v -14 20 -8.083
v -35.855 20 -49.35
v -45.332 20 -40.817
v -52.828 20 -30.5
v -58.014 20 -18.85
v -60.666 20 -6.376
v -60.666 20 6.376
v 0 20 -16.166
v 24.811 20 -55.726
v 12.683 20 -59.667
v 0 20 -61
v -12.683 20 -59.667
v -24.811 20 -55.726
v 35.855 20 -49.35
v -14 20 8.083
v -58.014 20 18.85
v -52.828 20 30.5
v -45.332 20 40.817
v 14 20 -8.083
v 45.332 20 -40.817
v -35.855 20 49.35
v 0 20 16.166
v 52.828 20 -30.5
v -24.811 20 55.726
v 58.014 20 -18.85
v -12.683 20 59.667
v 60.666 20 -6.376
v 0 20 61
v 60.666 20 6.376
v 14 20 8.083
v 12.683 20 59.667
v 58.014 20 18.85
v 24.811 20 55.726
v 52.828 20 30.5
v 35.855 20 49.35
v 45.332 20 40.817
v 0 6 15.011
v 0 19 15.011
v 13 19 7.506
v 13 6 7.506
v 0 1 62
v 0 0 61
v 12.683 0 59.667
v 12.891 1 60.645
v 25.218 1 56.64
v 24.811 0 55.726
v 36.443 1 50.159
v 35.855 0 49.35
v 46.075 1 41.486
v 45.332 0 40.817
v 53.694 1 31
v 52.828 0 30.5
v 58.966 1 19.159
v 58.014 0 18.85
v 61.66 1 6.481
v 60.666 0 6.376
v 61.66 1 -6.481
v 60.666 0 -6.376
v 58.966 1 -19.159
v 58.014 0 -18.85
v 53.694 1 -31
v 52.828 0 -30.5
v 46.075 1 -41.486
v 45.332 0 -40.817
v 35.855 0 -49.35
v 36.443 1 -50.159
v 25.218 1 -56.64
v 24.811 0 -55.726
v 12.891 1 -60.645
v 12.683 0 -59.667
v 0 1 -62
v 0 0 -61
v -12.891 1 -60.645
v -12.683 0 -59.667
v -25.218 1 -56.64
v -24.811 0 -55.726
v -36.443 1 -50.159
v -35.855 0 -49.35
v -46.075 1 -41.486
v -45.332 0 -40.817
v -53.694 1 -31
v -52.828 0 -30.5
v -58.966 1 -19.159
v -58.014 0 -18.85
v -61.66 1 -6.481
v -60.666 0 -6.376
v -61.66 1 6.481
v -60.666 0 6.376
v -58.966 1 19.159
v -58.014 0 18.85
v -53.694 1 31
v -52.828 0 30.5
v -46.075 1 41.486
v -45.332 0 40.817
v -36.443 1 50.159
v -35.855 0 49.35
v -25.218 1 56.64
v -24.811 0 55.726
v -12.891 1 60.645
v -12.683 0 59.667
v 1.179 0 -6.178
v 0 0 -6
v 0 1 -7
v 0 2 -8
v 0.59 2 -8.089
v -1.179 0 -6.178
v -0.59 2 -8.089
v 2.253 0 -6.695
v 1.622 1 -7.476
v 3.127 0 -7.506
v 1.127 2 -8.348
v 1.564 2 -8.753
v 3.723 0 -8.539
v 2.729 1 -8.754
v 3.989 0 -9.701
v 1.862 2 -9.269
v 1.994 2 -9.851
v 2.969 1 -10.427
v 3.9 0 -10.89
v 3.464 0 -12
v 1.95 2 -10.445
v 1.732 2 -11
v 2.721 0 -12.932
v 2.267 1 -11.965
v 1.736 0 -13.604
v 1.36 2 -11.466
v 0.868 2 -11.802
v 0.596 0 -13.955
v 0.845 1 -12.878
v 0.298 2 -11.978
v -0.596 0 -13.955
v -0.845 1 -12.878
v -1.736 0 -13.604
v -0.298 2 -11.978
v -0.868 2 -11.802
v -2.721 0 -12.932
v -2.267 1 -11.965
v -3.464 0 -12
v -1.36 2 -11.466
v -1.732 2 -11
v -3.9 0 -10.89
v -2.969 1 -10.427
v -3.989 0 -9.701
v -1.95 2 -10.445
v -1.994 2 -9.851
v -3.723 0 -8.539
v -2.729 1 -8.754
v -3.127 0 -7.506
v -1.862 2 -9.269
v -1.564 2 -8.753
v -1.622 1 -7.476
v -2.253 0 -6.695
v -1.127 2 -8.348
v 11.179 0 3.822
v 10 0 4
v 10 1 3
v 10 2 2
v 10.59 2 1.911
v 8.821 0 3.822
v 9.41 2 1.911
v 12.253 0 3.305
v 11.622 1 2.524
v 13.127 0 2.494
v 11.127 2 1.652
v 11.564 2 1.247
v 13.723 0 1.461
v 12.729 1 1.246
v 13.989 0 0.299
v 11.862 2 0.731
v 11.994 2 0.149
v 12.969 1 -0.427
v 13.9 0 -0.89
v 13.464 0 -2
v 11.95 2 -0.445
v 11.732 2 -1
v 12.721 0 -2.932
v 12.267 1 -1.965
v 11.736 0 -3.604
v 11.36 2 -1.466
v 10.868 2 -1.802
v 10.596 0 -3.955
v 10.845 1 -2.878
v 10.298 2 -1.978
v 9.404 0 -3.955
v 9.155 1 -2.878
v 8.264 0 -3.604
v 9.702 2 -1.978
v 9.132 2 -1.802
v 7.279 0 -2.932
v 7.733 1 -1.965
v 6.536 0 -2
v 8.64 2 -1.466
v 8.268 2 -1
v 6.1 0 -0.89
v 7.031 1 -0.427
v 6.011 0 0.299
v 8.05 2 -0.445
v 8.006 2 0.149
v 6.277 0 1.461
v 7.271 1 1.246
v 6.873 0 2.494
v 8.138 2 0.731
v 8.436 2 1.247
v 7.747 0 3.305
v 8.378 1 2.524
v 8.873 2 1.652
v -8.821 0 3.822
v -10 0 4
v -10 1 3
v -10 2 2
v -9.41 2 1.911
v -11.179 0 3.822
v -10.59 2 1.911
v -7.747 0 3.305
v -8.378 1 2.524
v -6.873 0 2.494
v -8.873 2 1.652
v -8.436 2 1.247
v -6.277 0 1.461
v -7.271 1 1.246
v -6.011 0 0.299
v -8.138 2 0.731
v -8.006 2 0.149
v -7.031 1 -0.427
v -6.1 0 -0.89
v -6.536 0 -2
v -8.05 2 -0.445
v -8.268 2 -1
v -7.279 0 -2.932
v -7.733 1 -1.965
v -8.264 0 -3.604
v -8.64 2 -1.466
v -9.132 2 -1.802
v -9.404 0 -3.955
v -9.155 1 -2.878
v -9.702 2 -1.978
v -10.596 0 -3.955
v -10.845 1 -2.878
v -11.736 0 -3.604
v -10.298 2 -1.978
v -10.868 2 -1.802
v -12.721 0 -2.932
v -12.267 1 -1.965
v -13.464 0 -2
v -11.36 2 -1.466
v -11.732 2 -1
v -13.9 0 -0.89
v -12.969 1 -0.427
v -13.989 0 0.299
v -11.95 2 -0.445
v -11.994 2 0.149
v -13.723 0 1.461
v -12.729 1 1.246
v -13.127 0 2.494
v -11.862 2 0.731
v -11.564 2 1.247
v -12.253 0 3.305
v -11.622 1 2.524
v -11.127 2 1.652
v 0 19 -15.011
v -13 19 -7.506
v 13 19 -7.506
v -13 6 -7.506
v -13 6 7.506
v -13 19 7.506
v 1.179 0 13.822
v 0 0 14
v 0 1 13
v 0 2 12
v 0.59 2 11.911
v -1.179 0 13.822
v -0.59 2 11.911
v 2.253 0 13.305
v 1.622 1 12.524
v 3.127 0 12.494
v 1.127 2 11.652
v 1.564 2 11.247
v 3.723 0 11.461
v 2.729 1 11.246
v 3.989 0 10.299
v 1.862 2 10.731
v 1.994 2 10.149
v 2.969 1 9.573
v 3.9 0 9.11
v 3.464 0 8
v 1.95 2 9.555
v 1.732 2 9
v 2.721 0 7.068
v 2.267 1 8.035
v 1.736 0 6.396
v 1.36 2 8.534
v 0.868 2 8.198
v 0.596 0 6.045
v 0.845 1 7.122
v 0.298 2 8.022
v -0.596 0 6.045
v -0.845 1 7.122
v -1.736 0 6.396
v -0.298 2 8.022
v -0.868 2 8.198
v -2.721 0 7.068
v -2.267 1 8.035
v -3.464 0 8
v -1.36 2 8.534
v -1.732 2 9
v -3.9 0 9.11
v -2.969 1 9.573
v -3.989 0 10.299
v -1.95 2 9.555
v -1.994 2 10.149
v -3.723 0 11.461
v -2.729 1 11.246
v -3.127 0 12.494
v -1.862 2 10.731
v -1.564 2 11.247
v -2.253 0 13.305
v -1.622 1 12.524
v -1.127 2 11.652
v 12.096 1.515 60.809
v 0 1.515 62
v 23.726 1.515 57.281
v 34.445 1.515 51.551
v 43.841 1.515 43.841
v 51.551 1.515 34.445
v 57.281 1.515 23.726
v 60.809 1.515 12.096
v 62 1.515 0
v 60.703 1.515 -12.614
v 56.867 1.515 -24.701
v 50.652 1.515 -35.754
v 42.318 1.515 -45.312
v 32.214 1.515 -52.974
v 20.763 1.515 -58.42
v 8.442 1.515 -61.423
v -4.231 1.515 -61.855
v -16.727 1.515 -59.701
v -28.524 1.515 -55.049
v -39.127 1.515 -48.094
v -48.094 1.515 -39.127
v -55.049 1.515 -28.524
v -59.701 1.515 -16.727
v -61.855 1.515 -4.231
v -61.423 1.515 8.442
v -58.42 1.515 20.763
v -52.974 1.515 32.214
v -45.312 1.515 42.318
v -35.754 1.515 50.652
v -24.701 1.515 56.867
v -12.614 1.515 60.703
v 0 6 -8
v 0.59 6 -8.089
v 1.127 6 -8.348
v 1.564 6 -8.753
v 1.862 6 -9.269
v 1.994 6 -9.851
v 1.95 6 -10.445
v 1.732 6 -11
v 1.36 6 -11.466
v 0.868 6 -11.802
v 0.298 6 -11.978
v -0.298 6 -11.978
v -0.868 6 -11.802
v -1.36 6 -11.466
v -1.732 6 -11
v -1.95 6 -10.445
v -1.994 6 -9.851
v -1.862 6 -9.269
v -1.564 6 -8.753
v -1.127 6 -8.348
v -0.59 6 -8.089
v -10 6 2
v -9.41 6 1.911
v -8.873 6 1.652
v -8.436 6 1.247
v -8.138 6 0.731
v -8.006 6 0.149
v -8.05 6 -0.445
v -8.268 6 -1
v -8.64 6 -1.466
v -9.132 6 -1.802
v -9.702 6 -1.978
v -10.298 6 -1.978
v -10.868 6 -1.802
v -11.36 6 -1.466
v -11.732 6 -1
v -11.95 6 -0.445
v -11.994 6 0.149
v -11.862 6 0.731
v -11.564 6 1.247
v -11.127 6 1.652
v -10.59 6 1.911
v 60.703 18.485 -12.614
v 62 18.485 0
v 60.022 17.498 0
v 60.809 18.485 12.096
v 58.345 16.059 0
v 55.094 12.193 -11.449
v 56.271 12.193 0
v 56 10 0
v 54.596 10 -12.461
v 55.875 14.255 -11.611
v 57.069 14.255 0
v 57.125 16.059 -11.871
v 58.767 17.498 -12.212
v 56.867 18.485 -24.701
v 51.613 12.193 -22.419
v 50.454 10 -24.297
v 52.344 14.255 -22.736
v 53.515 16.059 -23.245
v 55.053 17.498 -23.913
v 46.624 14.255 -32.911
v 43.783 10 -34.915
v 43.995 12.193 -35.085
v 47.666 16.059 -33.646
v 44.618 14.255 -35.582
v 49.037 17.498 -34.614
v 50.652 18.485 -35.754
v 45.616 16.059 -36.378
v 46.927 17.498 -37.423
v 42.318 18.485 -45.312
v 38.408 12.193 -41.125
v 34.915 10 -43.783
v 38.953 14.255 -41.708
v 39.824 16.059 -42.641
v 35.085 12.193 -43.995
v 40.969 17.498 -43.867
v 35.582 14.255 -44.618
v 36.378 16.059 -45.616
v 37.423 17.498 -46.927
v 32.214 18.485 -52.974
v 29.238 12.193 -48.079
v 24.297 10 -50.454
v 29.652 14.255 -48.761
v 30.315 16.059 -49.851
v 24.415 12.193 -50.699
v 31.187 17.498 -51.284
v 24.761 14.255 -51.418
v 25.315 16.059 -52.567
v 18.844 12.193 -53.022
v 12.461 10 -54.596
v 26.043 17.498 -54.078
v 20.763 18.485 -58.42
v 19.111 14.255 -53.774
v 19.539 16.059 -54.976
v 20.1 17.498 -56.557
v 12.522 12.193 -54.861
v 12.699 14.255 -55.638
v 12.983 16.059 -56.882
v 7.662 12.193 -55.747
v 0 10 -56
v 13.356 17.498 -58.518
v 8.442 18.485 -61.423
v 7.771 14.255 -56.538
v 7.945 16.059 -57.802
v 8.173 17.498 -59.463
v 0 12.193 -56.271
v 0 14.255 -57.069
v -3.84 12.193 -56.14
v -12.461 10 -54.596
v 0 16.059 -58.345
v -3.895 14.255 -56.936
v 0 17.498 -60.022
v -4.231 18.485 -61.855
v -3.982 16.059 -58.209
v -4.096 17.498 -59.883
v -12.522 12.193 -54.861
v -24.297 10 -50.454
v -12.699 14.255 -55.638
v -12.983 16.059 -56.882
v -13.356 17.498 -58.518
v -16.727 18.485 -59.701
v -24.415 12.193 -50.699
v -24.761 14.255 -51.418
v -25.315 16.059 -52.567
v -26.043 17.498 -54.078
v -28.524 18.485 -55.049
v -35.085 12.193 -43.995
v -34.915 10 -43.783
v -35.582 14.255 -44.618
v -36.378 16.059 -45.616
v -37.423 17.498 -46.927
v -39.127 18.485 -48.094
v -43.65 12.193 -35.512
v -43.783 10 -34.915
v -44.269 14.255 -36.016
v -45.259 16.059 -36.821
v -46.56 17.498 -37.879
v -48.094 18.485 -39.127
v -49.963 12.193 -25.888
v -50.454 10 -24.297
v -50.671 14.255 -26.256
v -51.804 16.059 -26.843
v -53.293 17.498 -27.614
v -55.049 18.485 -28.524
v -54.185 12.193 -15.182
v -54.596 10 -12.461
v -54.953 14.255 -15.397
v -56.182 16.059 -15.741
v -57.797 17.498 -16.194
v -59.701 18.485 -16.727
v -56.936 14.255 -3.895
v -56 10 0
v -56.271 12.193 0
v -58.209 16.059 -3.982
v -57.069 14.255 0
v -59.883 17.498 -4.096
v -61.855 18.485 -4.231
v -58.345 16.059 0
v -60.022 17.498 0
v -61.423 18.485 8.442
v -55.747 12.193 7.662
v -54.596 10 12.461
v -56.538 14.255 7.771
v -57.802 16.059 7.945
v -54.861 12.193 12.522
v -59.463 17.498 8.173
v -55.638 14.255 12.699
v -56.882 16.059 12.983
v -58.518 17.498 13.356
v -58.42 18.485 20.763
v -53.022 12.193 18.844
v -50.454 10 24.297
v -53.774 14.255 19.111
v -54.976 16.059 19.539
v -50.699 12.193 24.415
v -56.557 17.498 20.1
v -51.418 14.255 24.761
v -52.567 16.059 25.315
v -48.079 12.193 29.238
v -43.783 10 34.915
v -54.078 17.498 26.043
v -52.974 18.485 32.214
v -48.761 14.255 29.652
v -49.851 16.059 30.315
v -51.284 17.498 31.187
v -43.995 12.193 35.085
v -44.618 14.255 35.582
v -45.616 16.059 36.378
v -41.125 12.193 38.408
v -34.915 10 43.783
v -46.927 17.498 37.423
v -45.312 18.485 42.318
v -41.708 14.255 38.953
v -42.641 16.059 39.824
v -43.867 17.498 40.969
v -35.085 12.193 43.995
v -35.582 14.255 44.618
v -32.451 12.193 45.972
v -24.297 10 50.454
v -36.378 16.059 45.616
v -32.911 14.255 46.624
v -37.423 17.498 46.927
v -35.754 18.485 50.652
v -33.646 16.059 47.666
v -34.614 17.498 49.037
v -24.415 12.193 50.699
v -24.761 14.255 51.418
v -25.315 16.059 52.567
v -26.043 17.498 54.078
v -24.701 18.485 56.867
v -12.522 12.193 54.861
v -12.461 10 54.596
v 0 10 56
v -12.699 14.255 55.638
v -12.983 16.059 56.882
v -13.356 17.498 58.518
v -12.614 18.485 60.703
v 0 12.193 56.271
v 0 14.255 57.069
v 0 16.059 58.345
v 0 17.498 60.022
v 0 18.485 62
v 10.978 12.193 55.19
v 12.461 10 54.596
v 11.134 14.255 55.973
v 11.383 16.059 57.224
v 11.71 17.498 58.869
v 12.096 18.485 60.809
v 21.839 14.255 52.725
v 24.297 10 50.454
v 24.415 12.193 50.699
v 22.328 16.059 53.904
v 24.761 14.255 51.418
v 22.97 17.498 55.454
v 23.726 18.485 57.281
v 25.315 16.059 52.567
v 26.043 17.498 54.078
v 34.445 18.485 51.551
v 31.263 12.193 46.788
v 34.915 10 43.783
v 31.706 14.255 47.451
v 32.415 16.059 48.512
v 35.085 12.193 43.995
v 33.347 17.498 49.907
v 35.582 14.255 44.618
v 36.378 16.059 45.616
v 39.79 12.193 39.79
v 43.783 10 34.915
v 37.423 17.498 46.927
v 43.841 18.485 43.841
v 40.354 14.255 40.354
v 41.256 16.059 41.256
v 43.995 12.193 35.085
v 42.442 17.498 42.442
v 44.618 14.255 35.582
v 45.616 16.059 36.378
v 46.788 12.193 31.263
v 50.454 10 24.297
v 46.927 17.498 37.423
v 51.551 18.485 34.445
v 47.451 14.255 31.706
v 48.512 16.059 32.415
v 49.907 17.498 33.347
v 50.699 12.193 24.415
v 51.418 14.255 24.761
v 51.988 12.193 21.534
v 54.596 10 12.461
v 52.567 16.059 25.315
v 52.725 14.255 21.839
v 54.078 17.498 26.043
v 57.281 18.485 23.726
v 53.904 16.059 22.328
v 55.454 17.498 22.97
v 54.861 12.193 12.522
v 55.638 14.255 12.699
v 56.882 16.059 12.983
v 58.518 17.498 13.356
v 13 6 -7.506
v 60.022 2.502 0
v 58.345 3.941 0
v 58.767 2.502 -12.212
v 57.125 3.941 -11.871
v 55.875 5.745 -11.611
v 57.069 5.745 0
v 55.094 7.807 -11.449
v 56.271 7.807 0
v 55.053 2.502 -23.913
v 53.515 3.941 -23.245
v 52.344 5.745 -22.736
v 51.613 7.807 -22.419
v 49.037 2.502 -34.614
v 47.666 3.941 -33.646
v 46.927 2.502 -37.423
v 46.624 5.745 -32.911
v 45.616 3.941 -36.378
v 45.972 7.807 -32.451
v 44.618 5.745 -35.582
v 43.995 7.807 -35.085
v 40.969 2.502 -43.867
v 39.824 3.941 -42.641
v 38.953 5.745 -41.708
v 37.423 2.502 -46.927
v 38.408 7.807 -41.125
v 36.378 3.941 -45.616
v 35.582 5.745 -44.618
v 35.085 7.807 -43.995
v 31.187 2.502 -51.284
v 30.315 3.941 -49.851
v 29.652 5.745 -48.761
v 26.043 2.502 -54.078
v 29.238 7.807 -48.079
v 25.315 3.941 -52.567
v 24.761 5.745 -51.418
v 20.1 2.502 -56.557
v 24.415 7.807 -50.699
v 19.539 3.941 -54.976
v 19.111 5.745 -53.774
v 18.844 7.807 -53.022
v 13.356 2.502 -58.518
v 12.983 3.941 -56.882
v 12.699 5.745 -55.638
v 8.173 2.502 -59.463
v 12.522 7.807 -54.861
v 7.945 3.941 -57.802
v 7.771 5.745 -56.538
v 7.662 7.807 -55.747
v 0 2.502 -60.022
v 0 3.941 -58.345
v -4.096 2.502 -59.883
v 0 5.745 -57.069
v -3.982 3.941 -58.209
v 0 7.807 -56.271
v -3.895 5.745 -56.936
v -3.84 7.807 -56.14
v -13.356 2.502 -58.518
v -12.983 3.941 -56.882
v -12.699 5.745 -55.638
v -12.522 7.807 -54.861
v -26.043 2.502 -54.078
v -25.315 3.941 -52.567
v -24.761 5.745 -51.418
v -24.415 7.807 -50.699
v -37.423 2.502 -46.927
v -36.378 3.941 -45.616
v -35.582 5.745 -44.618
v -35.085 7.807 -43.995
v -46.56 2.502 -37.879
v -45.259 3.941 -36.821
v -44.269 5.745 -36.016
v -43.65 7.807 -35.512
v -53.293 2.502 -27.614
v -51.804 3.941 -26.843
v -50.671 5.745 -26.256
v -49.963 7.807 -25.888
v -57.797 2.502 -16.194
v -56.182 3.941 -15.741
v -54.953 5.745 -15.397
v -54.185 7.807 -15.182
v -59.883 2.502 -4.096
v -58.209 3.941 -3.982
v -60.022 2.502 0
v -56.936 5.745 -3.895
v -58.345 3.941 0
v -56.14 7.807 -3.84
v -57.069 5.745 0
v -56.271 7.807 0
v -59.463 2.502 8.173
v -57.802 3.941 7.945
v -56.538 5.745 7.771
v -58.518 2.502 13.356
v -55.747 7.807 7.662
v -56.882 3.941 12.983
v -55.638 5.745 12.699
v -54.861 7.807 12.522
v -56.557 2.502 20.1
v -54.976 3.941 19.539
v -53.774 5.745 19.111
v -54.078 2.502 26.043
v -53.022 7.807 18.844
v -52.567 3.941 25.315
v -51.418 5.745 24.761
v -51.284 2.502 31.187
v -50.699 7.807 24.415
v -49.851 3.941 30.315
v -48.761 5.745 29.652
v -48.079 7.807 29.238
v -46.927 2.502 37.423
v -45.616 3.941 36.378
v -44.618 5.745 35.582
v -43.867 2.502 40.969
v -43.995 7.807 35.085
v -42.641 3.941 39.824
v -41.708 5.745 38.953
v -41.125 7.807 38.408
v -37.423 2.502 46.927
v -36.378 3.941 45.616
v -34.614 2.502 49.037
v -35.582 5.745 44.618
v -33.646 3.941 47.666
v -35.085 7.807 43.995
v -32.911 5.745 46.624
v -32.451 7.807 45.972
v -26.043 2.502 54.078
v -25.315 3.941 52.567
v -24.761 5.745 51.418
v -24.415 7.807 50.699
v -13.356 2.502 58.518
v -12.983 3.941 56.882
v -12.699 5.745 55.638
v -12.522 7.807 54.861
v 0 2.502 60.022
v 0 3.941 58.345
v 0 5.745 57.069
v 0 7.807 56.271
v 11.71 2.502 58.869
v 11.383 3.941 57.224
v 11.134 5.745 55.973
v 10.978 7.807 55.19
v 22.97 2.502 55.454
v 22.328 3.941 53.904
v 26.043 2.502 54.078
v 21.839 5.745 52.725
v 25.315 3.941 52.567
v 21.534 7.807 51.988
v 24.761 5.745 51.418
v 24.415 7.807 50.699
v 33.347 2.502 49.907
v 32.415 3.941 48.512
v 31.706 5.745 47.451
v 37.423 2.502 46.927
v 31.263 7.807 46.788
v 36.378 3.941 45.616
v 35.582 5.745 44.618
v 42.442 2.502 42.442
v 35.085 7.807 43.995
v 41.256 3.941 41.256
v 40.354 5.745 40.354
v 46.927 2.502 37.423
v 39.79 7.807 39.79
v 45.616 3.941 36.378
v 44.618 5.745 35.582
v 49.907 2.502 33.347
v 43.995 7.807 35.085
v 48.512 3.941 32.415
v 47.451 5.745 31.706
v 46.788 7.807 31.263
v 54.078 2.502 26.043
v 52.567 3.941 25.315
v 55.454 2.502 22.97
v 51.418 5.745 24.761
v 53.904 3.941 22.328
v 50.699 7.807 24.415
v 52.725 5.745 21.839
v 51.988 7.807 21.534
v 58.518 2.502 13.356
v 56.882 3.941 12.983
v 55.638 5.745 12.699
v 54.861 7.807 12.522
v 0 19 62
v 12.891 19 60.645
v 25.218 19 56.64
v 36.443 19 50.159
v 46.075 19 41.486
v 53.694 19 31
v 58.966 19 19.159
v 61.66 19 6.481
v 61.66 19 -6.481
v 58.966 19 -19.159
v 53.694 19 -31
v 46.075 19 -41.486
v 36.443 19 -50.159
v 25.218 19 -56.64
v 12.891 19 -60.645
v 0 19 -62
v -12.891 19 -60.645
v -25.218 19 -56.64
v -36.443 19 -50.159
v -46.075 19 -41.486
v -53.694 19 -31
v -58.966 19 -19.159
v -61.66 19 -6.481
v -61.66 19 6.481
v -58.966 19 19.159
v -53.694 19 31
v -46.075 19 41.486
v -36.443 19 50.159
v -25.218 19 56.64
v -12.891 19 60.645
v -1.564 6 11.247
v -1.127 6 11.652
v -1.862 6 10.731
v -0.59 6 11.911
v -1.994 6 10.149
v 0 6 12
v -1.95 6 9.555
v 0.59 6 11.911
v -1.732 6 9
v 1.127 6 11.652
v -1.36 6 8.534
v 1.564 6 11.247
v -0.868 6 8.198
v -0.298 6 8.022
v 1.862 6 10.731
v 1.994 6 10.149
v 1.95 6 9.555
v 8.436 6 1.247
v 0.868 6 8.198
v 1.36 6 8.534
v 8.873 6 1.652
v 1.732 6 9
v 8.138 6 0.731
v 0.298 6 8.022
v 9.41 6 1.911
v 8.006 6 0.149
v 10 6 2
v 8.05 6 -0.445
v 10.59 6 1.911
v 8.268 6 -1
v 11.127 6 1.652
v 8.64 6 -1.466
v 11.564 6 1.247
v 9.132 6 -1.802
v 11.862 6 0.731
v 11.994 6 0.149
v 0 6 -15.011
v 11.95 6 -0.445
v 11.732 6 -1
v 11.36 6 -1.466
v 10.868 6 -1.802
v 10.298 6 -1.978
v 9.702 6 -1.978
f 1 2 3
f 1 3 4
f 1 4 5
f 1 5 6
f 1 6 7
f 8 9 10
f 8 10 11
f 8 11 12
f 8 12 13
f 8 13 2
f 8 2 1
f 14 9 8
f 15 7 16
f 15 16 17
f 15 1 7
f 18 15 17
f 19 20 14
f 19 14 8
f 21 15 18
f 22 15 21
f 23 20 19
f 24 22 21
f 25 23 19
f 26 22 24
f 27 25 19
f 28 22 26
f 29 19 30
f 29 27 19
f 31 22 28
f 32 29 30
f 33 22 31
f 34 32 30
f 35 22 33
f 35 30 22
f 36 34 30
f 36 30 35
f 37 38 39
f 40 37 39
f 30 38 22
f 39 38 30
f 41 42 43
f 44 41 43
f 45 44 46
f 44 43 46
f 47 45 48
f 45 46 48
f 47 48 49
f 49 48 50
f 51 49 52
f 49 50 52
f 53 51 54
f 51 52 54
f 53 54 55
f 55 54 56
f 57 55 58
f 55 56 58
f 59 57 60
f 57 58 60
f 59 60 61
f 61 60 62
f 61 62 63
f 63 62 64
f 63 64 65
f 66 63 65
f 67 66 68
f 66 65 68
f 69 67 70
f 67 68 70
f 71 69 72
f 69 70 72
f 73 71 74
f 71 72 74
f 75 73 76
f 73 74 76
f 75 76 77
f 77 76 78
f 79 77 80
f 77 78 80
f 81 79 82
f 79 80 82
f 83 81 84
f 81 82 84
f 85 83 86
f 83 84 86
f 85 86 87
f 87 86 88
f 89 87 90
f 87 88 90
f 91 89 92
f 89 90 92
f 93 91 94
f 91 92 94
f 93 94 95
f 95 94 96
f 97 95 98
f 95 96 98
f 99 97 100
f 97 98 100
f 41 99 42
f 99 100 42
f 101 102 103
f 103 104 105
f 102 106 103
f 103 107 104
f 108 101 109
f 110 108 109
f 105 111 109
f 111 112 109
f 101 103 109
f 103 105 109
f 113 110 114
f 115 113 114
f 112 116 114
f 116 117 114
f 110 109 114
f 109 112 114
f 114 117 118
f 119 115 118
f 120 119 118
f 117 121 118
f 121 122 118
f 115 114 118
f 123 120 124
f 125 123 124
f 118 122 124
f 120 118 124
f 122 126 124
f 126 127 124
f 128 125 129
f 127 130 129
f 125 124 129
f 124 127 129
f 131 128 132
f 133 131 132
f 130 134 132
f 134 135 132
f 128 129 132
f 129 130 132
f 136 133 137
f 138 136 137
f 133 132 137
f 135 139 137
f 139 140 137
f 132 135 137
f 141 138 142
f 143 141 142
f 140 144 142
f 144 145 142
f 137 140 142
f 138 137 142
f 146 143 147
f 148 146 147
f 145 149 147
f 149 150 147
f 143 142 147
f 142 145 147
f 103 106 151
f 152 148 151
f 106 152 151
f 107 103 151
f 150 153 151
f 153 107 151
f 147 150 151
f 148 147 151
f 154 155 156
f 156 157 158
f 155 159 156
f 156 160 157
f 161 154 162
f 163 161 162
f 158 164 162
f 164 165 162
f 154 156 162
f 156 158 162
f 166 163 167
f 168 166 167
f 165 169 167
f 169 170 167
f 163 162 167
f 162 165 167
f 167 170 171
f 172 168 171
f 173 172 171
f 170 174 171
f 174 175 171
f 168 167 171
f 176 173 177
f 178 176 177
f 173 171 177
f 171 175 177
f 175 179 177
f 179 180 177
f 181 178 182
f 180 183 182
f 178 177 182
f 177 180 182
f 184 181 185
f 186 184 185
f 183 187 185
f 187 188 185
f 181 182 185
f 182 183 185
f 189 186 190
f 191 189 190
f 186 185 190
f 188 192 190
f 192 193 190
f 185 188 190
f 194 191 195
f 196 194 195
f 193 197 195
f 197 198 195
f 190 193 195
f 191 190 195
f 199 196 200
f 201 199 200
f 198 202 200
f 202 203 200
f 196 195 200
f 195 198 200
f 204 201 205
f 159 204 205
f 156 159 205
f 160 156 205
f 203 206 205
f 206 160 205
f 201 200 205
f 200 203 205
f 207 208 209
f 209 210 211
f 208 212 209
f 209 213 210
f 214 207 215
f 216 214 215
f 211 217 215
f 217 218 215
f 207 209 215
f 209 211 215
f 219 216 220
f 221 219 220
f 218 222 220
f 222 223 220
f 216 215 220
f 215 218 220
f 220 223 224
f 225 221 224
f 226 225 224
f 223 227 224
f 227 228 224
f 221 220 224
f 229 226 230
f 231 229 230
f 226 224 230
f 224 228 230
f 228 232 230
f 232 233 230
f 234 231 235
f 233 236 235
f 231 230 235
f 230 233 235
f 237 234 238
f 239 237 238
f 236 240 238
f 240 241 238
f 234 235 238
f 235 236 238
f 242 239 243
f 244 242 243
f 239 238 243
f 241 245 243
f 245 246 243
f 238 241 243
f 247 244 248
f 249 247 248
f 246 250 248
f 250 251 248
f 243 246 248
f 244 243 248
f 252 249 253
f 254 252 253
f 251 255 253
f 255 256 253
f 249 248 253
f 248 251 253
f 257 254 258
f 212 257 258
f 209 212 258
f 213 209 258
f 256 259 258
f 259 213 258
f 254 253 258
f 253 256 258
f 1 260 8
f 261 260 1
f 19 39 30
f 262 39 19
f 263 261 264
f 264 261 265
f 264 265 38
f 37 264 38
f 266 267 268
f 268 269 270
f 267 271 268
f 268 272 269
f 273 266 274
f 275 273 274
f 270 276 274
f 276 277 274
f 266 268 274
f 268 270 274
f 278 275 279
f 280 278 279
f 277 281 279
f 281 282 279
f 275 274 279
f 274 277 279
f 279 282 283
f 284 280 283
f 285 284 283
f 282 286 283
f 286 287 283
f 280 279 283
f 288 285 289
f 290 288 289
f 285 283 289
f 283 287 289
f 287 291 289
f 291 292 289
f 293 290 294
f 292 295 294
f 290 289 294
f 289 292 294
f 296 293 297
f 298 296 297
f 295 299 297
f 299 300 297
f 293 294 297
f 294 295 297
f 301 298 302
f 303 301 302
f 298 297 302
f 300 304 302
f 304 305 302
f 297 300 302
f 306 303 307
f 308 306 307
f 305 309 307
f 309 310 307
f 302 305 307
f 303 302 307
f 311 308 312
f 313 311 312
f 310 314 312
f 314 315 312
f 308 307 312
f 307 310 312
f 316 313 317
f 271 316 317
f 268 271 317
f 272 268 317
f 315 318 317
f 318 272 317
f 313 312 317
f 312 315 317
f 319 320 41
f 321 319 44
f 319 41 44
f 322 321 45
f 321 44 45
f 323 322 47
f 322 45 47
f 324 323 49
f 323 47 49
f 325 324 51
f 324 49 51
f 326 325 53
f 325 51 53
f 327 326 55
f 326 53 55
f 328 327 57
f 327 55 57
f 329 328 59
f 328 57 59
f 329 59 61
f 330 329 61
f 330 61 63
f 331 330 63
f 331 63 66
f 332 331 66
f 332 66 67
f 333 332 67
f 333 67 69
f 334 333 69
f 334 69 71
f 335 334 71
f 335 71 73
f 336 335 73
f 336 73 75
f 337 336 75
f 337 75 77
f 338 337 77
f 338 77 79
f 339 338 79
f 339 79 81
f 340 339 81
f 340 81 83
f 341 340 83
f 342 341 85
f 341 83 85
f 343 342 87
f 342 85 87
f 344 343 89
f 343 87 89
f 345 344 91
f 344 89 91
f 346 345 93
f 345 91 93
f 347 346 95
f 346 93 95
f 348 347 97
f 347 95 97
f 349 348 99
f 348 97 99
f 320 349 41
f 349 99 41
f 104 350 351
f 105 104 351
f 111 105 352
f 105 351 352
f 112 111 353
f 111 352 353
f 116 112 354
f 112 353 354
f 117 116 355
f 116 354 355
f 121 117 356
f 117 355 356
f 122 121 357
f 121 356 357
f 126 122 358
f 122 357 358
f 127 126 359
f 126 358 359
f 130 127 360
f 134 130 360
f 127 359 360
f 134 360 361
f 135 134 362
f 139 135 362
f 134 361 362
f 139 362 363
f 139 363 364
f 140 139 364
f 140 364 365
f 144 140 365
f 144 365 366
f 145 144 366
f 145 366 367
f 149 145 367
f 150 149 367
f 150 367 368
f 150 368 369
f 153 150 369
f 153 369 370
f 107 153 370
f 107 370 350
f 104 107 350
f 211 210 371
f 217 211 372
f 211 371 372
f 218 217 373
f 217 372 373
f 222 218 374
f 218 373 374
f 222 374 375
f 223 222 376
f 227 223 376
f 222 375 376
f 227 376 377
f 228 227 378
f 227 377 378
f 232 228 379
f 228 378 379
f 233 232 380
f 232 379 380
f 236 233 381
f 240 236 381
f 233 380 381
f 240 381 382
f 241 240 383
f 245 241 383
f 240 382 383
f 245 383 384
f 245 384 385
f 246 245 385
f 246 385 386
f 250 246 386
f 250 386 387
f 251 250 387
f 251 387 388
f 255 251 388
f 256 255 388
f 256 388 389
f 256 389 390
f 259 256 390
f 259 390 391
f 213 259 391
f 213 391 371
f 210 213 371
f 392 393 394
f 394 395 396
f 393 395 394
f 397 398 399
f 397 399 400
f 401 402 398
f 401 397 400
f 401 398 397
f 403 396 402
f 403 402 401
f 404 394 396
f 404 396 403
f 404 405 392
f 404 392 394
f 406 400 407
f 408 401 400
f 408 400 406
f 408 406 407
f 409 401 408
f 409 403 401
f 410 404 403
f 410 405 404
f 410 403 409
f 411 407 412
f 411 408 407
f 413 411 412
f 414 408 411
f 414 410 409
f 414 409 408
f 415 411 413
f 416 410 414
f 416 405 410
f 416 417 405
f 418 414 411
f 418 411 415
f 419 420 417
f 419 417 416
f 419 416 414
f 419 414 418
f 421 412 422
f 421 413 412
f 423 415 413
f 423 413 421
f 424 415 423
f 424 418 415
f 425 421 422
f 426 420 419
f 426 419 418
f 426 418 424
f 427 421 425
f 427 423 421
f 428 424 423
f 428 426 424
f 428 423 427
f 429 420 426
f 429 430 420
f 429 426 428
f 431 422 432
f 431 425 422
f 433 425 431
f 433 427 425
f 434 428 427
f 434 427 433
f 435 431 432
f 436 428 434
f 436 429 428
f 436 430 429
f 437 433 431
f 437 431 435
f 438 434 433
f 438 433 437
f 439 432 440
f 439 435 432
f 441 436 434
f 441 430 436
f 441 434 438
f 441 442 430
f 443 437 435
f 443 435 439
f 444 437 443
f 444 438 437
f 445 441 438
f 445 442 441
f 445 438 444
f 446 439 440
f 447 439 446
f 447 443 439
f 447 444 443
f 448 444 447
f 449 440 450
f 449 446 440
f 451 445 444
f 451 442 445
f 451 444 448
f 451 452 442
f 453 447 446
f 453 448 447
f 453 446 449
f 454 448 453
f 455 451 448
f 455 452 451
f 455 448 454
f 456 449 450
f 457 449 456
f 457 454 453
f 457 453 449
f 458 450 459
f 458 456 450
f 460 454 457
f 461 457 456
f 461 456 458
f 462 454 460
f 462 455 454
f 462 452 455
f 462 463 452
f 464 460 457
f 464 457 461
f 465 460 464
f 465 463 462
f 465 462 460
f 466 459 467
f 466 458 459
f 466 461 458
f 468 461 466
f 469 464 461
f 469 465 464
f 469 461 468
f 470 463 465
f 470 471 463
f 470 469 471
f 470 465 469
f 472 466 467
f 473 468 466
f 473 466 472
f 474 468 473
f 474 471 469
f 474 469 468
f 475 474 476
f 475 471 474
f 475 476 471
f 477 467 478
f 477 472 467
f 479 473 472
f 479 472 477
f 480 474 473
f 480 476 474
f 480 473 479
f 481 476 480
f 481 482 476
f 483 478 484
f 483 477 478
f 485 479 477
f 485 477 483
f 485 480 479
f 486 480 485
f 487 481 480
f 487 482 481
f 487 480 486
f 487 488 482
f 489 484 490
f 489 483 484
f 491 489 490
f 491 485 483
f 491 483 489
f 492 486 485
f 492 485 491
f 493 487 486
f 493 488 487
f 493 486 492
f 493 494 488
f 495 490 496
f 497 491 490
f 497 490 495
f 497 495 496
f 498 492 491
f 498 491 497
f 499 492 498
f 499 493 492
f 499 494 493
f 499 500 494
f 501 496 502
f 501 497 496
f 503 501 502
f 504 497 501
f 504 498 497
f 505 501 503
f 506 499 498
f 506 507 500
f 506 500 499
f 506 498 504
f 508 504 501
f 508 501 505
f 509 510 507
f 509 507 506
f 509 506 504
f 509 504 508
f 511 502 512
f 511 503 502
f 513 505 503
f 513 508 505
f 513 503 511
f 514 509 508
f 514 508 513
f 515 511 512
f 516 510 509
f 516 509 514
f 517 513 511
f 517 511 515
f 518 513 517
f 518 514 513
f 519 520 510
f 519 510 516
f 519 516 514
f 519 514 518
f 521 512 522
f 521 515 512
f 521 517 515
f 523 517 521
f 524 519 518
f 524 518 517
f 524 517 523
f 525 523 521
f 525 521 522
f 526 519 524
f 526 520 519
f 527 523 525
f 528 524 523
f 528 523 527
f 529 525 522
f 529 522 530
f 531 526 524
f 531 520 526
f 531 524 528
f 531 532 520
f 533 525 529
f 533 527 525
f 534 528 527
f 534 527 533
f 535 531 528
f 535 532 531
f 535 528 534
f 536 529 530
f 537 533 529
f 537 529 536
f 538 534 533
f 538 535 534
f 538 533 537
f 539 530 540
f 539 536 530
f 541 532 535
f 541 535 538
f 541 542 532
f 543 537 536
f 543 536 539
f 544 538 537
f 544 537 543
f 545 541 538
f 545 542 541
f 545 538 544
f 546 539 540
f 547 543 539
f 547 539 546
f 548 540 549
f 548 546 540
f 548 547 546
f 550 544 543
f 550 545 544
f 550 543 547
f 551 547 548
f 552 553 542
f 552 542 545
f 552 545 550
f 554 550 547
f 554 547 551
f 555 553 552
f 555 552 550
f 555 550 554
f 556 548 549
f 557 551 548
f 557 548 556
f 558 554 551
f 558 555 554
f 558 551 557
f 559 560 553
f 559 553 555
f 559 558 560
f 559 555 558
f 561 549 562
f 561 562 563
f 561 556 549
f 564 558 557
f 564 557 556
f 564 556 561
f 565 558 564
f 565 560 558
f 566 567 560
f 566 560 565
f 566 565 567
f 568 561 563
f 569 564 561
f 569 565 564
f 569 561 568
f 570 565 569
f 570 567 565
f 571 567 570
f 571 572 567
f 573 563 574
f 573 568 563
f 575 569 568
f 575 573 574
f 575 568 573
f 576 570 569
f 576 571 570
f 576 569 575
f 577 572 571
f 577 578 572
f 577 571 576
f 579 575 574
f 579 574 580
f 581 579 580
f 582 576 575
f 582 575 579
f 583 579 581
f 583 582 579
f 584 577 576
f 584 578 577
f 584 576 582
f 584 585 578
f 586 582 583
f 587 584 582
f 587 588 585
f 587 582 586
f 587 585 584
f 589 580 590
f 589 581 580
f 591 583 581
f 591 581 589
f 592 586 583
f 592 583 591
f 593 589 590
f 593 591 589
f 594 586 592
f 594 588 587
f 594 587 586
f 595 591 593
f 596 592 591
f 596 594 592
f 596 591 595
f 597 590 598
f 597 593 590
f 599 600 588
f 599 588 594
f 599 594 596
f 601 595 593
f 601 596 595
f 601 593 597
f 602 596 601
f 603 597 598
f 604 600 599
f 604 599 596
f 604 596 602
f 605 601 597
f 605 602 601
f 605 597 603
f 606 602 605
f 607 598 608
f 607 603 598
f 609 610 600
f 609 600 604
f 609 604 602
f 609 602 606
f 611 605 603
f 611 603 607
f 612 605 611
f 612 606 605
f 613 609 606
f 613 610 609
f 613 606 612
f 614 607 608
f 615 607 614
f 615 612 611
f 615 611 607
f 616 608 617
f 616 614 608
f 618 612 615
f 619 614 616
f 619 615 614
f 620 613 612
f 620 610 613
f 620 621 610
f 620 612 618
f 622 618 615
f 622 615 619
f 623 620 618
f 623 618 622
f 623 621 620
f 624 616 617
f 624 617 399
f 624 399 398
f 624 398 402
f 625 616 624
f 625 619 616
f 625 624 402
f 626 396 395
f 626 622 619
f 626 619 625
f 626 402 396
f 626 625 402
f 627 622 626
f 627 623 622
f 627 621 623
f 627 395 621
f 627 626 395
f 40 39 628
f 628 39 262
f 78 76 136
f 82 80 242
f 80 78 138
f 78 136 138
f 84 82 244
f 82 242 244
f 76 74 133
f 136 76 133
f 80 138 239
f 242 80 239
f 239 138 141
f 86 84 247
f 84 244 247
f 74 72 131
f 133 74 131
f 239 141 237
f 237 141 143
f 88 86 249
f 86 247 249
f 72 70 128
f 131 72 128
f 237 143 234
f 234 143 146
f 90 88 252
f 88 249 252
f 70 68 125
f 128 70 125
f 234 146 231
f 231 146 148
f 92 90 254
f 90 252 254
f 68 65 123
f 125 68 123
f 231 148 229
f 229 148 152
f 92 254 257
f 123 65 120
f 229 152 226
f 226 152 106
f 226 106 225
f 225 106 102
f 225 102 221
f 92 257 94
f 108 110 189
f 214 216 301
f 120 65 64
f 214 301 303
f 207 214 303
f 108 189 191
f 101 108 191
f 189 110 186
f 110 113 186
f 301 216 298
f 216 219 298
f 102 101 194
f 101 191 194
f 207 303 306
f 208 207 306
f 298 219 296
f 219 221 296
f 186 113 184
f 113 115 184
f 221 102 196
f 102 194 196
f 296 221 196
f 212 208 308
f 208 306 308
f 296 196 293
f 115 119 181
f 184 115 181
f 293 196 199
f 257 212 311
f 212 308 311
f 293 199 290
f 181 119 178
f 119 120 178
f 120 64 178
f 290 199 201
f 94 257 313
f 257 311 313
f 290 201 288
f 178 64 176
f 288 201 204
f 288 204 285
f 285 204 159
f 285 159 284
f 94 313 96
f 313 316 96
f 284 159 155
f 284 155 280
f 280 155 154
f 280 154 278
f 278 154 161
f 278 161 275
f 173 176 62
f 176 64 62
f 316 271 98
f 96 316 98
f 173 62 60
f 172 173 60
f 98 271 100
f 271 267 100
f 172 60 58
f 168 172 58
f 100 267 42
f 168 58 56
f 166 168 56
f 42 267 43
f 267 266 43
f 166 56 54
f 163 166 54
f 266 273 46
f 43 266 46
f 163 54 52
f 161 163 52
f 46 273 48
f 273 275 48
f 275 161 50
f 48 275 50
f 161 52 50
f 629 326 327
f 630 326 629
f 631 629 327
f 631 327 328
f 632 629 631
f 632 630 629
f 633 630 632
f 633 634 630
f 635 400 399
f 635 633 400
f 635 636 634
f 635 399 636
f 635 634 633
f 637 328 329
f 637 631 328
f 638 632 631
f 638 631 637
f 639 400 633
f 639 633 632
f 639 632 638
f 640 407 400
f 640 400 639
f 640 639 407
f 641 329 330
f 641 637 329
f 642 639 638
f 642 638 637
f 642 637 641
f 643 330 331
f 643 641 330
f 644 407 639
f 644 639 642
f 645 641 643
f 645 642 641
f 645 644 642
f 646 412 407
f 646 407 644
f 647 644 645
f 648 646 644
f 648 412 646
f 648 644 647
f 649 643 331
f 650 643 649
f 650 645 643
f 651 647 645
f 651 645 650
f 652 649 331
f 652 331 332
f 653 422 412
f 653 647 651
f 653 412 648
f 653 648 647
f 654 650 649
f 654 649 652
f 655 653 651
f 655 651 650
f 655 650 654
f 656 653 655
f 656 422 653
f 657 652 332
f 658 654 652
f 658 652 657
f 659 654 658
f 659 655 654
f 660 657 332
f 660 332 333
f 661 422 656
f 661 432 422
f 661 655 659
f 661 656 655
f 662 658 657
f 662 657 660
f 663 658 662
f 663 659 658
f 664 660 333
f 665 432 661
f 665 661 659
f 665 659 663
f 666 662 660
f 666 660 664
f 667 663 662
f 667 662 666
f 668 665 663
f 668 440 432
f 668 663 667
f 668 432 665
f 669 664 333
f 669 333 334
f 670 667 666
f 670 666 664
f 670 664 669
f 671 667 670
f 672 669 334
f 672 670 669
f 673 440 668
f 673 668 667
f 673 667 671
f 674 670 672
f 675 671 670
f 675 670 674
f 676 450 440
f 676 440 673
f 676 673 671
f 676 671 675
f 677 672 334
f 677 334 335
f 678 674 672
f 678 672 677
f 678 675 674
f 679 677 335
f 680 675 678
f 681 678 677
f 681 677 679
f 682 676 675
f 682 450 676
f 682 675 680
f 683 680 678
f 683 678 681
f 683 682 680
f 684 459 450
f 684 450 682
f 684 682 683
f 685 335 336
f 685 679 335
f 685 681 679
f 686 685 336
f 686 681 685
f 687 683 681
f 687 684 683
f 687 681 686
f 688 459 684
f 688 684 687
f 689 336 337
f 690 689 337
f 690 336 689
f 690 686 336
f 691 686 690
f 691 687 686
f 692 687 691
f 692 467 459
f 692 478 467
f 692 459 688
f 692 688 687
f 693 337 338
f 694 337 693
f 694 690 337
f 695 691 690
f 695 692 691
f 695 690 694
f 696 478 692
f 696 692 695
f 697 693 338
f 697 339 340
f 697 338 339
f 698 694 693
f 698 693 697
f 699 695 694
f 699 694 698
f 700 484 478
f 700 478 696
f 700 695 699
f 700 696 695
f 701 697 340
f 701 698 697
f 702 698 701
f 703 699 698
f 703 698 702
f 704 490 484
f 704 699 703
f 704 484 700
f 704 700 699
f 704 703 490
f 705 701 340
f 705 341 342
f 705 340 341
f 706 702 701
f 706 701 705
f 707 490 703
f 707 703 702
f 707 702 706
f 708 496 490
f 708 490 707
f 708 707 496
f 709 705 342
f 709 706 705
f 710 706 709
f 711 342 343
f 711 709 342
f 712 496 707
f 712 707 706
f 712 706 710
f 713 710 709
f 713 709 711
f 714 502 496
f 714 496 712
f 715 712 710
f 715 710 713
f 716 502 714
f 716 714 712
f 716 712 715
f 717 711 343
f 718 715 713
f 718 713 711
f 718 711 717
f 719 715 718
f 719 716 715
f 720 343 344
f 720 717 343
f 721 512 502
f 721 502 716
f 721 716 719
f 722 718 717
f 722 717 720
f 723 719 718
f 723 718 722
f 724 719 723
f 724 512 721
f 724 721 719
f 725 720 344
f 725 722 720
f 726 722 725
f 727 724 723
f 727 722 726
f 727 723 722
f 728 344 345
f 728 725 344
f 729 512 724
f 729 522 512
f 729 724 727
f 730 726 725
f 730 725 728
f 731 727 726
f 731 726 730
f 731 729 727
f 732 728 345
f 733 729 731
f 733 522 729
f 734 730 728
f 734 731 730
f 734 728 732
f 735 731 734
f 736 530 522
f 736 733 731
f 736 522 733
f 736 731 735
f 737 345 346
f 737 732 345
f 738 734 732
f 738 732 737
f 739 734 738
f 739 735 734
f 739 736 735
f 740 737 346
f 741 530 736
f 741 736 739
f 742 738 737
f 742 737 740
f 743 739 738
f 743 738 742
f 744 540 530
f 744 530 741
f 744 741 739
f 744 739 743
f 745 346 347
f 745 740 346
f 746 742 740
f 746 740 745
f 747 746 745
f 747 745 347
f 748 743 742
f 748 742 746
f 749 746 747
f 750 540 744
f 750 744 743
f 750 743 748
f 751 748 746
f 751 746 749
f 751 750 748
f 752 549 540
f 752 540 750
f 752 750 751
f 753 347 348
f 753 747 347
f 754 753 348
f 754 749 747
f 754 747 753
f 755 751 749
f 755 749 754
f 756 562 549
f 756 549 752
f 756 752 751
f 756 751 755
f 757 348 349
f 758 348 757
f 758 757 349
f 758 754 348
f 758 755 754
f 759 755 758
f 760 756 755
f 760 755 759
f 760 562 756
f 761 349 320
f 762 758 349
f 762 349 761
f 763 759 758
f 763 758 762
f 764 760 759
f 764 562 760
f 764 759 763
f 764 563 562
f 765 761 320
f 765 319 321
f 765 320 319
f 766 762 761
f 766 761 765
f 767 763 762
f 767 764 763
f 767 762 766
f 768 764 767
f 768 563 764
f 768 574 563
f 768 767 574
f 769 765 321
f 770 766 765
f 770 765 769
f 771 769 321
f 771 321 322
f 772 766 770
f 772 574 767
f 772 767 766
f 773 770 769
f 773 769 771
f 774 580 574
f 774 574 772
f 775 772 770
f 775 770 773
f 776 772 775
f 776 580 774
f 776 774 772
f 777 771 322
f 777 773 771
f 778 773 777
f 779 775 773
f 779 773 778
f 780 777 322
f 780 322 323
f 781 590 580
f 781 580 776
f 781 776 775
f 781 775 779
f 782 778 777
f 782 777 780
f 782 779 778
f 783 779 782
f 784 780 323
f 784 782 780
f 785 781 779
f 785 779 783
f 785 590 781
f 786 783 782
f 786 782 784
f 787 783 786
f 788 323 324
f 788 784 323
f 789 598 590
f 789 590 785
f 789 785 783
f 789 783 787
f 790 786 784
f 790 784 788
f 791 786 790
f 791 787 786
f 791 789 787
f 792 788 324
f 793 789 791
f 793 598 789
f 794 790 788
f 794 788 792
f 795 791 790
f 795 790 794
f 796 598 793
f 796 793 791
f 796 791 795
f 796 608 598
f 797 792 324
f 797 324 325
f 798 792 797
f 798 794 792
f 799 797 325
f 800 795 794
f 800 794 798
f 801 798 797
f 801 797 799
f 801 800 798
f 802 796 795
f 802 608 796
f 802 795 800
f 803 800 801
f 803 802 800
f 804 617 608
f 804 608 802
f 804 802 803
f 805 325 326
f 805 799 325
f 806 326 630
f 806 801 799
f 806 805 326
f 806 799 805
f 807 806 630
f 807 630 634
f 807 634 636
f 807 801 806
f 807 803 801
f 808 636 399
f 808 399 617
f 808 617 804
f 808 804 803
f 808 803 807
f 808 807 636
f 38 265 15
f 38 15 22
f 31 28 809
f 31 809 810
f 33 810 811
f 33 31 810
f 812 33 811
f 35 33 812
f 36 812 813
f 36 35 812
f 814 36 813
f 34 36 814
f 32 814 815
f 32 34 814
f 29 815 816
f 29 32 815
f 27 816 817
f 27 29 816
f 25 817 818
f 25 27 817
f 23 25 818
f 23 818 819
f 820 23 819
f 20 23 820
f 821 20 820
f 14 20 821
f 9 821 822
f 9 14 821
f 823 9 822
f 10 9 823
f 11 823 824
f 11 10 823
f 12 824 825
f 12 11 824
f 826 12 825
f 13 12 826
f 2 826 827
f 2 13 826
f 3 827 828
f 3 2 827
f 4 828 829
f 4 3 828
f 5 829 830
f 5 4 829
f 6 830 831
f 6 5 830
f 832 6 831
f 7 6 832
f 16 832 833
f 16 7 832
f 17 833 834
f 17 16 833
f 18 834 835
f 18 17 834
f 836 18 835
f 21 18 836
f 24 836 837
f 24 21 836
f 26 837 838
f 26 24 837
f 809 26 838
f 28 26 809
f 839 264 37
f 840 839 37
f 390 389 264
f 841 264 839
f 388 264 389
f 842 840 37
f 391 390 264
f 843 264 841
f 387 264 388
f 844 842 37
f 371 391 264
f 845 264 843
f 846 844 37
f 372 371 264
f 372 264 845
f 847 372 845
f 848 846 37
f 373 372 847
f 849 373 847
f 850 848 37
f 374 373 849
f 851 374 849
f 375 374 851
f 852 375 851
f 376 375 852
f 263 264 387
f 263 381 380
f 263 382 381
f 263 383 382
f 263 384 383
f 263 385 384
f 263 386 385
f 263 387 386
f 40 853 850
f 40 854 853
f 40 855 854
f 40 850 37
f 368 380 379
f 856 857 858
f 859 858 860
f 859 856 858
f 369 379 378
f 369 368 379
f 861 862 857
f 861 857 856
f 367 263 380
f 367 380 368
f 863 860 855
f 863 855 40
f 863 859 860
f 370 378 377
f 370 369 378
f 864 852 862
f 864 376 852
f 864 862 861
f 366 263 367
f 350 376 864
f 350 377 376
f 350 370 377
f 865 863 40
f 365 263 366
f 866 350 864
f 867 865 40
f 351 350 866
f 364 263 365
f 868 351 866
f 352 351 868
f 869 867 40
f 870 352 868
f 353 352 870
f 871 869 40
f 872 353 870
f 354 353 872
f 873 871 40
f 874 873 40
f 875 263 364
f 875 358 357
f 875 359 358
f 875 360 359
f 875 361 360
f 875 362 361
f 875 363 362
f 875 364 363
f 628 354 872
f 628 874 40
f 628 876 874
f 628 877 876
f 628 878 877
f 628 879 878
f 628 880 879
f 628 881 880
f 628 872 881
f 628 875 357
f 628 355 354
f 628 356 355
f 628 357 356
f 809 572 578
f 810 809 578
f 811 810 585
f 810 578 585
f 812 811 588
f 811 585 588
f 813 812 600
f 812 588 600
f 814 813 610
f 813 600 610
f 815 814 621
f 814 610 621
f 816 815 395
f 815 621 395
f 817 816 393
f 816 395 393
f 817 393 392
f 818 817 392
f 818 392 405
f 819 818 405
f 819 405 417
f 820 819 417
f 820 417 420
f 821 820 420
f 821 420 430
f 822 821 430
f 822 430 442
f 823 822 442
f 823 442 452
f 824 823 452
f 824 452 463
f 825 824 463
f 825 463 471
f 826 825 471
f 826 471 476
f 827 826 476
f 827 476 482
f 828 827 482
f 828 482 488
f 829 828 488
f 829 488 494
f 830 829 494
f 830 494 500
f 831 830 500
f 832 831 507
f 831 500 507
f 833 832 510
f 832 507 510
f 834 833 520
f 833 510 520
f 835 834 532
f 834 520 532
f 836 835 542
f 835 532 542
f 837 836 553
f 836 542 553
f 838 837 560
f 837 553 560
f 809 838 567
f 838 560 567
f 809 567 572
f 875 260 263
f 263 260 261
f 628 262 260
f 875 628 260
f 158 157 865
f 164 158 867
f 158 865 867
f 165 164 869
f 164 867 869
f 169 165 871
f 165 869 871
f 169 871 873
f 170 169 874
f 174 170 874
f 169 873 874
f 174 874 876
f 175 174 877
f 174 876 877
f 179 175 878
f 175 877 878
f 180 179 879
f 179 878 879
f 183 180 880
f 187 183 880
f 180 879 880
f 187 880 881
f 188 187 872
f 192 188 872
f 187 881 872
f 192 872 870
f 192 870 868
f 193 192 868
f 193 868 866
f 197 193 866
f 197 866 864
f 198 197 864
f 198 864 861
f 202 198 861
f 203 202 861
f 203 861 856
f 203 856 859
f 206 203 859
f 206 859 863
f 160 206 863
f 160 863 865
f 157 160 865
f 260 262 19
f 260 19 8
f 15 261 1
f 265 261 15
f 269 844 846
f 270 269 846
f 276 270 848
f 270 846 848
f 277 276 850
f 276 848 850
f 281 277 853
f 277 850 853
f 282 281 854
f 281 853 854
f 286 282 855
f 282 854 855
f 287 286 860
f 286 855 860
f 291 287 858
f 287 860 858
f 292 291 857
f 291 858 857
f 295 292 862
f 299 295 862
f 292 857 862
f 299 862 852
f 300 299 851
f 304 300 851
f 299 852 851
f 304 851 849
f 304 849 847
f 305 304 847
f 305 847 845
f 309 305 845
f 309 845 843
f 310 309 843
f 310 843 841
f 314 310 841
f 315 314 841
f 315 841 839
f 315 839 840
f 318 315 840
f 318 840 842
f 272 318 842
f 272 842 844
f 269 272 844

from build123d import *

# Parameters (mm, degrees)
SKETCH_1_R          = 62
EXTRUDE_1_DEPTH     = 20
SKETCH_3_R          = 9
CHAMFER_3_SIZE      = 1
CUT_EXTRUDE_2_DEPTH = 14
SKETCH_6_R          = 2
CUT_EXTRUDE_3_DEPTH = 90.933308624
CHAMFER_2_SIZE      = 1
CHAMFER_4_SIZE      = 2


with BuildPart() as part:
    # Эскиз1 → Бобышка-Вытянуть1 (new body)
    with BuildSketch(Plane(origin=(0, 0, 0), x_dir=(1, 0, 0), z_dir=(0, 1, 0))):
        with Locations(Location((0, 0, 0), (0, 0, 270))):
            Circle(SKETCH_1_R)
    extrude(amount=EXTRUDE_1_DEPTH)

    # Эскиз3 → Вырез-Повернуть2 (revolve, cut)
    with BuildSketch(Plane.XY, mode=Mode.PRIVATE) as cut_revolve_2_sk:
        with Locations((-65, 10)):
            Circle(SKETCH_3_R)
    revolve(cut_revolve_2_sk.sketch.rotate(Axis((0, 0, 0), (0, 1, 0)), 180), axis=Axis((0, 0, 0), (0, 1, 0)), mode=Mode.SUBTRACT)

    # Фаска3
    chamfer_3_edges = [part.edges().sort_by_distance(p)[0] for p in [
        (0, 0, -62),
    ]]
    chamfer(chamfer_3_edges, length=CHAMFER_3_SIZE)

    # Эскиз5 → Вырез-Вытянуть2 (cut)
    with BuildSketch(Plane(origin=(0, 20, 0), x_dir=(1, 0, 0), z_dir=(0, 1, 0))):
        Polygon((0, 15.011106999), (-13, 7.505553499), (-13, -7.505553499), (0, -15.011106999), (13, -7.505553499), (13, 7.505553499), align=None)
    extrude(amount=-CUT_EXTRUDE_2_DEPTH, mode=Mode.SUBTRACT)

    # Эскиз6 → Вырез-Вытянуть3 (cut, through all)
    with BuildSketch(Plane(origin=(0, 20, 0), x_dir=(1, 0, 0), z_dir=(0, 1, 0))):
        with Locations(Location((0, 10, 0), (0, 0, 270))):
            Circle(SKETCH_6_R)
        with Locations(Location((10, 0, 0), (0, 0, 270))):
            Circle(SKETCH_6_R)
        with Locations(Location((0, -10, 0), (0, 0, 270))):
            Circle(SKETCH_6_R)
        with Locations(Location((-10, 0, 0), (0, 0, 270))):
            Circle(SKETCH_6_R)
    extrude(amount=-CUT_EXTRUDE_3_DEPTH, mode=Mode.SUBTRACT)

    # Фаска2
    chamfer_2_edges = [part.edges().sort_by_distance(p)[0] for p in [
        (6.5, 20, -11.258330249),
        (-6.5, 20, -11.258330249),
        (-13, 20, 0),
        (-6.5, 20, 11.258330249),
        (6.5, 20, 11.258330249),
        (13, 20, 0),
        (0, 20, -62),
    ]]
    chamfer(chamfer_2_edges, length=CHAMFER_2_SIZE)

    # Фаска4
    chamfer_4_edges = [part.edges().sort_by_distance(p)[0] for p in [
        (0, 0, -12),
        (10, 0, -2),
        (0, 0, 8),
        (-10, 0, -2),
    ]]
    chamfer(chamfer_4_edges, length=CHAMFER_4_SIZE)


solid = part.part
